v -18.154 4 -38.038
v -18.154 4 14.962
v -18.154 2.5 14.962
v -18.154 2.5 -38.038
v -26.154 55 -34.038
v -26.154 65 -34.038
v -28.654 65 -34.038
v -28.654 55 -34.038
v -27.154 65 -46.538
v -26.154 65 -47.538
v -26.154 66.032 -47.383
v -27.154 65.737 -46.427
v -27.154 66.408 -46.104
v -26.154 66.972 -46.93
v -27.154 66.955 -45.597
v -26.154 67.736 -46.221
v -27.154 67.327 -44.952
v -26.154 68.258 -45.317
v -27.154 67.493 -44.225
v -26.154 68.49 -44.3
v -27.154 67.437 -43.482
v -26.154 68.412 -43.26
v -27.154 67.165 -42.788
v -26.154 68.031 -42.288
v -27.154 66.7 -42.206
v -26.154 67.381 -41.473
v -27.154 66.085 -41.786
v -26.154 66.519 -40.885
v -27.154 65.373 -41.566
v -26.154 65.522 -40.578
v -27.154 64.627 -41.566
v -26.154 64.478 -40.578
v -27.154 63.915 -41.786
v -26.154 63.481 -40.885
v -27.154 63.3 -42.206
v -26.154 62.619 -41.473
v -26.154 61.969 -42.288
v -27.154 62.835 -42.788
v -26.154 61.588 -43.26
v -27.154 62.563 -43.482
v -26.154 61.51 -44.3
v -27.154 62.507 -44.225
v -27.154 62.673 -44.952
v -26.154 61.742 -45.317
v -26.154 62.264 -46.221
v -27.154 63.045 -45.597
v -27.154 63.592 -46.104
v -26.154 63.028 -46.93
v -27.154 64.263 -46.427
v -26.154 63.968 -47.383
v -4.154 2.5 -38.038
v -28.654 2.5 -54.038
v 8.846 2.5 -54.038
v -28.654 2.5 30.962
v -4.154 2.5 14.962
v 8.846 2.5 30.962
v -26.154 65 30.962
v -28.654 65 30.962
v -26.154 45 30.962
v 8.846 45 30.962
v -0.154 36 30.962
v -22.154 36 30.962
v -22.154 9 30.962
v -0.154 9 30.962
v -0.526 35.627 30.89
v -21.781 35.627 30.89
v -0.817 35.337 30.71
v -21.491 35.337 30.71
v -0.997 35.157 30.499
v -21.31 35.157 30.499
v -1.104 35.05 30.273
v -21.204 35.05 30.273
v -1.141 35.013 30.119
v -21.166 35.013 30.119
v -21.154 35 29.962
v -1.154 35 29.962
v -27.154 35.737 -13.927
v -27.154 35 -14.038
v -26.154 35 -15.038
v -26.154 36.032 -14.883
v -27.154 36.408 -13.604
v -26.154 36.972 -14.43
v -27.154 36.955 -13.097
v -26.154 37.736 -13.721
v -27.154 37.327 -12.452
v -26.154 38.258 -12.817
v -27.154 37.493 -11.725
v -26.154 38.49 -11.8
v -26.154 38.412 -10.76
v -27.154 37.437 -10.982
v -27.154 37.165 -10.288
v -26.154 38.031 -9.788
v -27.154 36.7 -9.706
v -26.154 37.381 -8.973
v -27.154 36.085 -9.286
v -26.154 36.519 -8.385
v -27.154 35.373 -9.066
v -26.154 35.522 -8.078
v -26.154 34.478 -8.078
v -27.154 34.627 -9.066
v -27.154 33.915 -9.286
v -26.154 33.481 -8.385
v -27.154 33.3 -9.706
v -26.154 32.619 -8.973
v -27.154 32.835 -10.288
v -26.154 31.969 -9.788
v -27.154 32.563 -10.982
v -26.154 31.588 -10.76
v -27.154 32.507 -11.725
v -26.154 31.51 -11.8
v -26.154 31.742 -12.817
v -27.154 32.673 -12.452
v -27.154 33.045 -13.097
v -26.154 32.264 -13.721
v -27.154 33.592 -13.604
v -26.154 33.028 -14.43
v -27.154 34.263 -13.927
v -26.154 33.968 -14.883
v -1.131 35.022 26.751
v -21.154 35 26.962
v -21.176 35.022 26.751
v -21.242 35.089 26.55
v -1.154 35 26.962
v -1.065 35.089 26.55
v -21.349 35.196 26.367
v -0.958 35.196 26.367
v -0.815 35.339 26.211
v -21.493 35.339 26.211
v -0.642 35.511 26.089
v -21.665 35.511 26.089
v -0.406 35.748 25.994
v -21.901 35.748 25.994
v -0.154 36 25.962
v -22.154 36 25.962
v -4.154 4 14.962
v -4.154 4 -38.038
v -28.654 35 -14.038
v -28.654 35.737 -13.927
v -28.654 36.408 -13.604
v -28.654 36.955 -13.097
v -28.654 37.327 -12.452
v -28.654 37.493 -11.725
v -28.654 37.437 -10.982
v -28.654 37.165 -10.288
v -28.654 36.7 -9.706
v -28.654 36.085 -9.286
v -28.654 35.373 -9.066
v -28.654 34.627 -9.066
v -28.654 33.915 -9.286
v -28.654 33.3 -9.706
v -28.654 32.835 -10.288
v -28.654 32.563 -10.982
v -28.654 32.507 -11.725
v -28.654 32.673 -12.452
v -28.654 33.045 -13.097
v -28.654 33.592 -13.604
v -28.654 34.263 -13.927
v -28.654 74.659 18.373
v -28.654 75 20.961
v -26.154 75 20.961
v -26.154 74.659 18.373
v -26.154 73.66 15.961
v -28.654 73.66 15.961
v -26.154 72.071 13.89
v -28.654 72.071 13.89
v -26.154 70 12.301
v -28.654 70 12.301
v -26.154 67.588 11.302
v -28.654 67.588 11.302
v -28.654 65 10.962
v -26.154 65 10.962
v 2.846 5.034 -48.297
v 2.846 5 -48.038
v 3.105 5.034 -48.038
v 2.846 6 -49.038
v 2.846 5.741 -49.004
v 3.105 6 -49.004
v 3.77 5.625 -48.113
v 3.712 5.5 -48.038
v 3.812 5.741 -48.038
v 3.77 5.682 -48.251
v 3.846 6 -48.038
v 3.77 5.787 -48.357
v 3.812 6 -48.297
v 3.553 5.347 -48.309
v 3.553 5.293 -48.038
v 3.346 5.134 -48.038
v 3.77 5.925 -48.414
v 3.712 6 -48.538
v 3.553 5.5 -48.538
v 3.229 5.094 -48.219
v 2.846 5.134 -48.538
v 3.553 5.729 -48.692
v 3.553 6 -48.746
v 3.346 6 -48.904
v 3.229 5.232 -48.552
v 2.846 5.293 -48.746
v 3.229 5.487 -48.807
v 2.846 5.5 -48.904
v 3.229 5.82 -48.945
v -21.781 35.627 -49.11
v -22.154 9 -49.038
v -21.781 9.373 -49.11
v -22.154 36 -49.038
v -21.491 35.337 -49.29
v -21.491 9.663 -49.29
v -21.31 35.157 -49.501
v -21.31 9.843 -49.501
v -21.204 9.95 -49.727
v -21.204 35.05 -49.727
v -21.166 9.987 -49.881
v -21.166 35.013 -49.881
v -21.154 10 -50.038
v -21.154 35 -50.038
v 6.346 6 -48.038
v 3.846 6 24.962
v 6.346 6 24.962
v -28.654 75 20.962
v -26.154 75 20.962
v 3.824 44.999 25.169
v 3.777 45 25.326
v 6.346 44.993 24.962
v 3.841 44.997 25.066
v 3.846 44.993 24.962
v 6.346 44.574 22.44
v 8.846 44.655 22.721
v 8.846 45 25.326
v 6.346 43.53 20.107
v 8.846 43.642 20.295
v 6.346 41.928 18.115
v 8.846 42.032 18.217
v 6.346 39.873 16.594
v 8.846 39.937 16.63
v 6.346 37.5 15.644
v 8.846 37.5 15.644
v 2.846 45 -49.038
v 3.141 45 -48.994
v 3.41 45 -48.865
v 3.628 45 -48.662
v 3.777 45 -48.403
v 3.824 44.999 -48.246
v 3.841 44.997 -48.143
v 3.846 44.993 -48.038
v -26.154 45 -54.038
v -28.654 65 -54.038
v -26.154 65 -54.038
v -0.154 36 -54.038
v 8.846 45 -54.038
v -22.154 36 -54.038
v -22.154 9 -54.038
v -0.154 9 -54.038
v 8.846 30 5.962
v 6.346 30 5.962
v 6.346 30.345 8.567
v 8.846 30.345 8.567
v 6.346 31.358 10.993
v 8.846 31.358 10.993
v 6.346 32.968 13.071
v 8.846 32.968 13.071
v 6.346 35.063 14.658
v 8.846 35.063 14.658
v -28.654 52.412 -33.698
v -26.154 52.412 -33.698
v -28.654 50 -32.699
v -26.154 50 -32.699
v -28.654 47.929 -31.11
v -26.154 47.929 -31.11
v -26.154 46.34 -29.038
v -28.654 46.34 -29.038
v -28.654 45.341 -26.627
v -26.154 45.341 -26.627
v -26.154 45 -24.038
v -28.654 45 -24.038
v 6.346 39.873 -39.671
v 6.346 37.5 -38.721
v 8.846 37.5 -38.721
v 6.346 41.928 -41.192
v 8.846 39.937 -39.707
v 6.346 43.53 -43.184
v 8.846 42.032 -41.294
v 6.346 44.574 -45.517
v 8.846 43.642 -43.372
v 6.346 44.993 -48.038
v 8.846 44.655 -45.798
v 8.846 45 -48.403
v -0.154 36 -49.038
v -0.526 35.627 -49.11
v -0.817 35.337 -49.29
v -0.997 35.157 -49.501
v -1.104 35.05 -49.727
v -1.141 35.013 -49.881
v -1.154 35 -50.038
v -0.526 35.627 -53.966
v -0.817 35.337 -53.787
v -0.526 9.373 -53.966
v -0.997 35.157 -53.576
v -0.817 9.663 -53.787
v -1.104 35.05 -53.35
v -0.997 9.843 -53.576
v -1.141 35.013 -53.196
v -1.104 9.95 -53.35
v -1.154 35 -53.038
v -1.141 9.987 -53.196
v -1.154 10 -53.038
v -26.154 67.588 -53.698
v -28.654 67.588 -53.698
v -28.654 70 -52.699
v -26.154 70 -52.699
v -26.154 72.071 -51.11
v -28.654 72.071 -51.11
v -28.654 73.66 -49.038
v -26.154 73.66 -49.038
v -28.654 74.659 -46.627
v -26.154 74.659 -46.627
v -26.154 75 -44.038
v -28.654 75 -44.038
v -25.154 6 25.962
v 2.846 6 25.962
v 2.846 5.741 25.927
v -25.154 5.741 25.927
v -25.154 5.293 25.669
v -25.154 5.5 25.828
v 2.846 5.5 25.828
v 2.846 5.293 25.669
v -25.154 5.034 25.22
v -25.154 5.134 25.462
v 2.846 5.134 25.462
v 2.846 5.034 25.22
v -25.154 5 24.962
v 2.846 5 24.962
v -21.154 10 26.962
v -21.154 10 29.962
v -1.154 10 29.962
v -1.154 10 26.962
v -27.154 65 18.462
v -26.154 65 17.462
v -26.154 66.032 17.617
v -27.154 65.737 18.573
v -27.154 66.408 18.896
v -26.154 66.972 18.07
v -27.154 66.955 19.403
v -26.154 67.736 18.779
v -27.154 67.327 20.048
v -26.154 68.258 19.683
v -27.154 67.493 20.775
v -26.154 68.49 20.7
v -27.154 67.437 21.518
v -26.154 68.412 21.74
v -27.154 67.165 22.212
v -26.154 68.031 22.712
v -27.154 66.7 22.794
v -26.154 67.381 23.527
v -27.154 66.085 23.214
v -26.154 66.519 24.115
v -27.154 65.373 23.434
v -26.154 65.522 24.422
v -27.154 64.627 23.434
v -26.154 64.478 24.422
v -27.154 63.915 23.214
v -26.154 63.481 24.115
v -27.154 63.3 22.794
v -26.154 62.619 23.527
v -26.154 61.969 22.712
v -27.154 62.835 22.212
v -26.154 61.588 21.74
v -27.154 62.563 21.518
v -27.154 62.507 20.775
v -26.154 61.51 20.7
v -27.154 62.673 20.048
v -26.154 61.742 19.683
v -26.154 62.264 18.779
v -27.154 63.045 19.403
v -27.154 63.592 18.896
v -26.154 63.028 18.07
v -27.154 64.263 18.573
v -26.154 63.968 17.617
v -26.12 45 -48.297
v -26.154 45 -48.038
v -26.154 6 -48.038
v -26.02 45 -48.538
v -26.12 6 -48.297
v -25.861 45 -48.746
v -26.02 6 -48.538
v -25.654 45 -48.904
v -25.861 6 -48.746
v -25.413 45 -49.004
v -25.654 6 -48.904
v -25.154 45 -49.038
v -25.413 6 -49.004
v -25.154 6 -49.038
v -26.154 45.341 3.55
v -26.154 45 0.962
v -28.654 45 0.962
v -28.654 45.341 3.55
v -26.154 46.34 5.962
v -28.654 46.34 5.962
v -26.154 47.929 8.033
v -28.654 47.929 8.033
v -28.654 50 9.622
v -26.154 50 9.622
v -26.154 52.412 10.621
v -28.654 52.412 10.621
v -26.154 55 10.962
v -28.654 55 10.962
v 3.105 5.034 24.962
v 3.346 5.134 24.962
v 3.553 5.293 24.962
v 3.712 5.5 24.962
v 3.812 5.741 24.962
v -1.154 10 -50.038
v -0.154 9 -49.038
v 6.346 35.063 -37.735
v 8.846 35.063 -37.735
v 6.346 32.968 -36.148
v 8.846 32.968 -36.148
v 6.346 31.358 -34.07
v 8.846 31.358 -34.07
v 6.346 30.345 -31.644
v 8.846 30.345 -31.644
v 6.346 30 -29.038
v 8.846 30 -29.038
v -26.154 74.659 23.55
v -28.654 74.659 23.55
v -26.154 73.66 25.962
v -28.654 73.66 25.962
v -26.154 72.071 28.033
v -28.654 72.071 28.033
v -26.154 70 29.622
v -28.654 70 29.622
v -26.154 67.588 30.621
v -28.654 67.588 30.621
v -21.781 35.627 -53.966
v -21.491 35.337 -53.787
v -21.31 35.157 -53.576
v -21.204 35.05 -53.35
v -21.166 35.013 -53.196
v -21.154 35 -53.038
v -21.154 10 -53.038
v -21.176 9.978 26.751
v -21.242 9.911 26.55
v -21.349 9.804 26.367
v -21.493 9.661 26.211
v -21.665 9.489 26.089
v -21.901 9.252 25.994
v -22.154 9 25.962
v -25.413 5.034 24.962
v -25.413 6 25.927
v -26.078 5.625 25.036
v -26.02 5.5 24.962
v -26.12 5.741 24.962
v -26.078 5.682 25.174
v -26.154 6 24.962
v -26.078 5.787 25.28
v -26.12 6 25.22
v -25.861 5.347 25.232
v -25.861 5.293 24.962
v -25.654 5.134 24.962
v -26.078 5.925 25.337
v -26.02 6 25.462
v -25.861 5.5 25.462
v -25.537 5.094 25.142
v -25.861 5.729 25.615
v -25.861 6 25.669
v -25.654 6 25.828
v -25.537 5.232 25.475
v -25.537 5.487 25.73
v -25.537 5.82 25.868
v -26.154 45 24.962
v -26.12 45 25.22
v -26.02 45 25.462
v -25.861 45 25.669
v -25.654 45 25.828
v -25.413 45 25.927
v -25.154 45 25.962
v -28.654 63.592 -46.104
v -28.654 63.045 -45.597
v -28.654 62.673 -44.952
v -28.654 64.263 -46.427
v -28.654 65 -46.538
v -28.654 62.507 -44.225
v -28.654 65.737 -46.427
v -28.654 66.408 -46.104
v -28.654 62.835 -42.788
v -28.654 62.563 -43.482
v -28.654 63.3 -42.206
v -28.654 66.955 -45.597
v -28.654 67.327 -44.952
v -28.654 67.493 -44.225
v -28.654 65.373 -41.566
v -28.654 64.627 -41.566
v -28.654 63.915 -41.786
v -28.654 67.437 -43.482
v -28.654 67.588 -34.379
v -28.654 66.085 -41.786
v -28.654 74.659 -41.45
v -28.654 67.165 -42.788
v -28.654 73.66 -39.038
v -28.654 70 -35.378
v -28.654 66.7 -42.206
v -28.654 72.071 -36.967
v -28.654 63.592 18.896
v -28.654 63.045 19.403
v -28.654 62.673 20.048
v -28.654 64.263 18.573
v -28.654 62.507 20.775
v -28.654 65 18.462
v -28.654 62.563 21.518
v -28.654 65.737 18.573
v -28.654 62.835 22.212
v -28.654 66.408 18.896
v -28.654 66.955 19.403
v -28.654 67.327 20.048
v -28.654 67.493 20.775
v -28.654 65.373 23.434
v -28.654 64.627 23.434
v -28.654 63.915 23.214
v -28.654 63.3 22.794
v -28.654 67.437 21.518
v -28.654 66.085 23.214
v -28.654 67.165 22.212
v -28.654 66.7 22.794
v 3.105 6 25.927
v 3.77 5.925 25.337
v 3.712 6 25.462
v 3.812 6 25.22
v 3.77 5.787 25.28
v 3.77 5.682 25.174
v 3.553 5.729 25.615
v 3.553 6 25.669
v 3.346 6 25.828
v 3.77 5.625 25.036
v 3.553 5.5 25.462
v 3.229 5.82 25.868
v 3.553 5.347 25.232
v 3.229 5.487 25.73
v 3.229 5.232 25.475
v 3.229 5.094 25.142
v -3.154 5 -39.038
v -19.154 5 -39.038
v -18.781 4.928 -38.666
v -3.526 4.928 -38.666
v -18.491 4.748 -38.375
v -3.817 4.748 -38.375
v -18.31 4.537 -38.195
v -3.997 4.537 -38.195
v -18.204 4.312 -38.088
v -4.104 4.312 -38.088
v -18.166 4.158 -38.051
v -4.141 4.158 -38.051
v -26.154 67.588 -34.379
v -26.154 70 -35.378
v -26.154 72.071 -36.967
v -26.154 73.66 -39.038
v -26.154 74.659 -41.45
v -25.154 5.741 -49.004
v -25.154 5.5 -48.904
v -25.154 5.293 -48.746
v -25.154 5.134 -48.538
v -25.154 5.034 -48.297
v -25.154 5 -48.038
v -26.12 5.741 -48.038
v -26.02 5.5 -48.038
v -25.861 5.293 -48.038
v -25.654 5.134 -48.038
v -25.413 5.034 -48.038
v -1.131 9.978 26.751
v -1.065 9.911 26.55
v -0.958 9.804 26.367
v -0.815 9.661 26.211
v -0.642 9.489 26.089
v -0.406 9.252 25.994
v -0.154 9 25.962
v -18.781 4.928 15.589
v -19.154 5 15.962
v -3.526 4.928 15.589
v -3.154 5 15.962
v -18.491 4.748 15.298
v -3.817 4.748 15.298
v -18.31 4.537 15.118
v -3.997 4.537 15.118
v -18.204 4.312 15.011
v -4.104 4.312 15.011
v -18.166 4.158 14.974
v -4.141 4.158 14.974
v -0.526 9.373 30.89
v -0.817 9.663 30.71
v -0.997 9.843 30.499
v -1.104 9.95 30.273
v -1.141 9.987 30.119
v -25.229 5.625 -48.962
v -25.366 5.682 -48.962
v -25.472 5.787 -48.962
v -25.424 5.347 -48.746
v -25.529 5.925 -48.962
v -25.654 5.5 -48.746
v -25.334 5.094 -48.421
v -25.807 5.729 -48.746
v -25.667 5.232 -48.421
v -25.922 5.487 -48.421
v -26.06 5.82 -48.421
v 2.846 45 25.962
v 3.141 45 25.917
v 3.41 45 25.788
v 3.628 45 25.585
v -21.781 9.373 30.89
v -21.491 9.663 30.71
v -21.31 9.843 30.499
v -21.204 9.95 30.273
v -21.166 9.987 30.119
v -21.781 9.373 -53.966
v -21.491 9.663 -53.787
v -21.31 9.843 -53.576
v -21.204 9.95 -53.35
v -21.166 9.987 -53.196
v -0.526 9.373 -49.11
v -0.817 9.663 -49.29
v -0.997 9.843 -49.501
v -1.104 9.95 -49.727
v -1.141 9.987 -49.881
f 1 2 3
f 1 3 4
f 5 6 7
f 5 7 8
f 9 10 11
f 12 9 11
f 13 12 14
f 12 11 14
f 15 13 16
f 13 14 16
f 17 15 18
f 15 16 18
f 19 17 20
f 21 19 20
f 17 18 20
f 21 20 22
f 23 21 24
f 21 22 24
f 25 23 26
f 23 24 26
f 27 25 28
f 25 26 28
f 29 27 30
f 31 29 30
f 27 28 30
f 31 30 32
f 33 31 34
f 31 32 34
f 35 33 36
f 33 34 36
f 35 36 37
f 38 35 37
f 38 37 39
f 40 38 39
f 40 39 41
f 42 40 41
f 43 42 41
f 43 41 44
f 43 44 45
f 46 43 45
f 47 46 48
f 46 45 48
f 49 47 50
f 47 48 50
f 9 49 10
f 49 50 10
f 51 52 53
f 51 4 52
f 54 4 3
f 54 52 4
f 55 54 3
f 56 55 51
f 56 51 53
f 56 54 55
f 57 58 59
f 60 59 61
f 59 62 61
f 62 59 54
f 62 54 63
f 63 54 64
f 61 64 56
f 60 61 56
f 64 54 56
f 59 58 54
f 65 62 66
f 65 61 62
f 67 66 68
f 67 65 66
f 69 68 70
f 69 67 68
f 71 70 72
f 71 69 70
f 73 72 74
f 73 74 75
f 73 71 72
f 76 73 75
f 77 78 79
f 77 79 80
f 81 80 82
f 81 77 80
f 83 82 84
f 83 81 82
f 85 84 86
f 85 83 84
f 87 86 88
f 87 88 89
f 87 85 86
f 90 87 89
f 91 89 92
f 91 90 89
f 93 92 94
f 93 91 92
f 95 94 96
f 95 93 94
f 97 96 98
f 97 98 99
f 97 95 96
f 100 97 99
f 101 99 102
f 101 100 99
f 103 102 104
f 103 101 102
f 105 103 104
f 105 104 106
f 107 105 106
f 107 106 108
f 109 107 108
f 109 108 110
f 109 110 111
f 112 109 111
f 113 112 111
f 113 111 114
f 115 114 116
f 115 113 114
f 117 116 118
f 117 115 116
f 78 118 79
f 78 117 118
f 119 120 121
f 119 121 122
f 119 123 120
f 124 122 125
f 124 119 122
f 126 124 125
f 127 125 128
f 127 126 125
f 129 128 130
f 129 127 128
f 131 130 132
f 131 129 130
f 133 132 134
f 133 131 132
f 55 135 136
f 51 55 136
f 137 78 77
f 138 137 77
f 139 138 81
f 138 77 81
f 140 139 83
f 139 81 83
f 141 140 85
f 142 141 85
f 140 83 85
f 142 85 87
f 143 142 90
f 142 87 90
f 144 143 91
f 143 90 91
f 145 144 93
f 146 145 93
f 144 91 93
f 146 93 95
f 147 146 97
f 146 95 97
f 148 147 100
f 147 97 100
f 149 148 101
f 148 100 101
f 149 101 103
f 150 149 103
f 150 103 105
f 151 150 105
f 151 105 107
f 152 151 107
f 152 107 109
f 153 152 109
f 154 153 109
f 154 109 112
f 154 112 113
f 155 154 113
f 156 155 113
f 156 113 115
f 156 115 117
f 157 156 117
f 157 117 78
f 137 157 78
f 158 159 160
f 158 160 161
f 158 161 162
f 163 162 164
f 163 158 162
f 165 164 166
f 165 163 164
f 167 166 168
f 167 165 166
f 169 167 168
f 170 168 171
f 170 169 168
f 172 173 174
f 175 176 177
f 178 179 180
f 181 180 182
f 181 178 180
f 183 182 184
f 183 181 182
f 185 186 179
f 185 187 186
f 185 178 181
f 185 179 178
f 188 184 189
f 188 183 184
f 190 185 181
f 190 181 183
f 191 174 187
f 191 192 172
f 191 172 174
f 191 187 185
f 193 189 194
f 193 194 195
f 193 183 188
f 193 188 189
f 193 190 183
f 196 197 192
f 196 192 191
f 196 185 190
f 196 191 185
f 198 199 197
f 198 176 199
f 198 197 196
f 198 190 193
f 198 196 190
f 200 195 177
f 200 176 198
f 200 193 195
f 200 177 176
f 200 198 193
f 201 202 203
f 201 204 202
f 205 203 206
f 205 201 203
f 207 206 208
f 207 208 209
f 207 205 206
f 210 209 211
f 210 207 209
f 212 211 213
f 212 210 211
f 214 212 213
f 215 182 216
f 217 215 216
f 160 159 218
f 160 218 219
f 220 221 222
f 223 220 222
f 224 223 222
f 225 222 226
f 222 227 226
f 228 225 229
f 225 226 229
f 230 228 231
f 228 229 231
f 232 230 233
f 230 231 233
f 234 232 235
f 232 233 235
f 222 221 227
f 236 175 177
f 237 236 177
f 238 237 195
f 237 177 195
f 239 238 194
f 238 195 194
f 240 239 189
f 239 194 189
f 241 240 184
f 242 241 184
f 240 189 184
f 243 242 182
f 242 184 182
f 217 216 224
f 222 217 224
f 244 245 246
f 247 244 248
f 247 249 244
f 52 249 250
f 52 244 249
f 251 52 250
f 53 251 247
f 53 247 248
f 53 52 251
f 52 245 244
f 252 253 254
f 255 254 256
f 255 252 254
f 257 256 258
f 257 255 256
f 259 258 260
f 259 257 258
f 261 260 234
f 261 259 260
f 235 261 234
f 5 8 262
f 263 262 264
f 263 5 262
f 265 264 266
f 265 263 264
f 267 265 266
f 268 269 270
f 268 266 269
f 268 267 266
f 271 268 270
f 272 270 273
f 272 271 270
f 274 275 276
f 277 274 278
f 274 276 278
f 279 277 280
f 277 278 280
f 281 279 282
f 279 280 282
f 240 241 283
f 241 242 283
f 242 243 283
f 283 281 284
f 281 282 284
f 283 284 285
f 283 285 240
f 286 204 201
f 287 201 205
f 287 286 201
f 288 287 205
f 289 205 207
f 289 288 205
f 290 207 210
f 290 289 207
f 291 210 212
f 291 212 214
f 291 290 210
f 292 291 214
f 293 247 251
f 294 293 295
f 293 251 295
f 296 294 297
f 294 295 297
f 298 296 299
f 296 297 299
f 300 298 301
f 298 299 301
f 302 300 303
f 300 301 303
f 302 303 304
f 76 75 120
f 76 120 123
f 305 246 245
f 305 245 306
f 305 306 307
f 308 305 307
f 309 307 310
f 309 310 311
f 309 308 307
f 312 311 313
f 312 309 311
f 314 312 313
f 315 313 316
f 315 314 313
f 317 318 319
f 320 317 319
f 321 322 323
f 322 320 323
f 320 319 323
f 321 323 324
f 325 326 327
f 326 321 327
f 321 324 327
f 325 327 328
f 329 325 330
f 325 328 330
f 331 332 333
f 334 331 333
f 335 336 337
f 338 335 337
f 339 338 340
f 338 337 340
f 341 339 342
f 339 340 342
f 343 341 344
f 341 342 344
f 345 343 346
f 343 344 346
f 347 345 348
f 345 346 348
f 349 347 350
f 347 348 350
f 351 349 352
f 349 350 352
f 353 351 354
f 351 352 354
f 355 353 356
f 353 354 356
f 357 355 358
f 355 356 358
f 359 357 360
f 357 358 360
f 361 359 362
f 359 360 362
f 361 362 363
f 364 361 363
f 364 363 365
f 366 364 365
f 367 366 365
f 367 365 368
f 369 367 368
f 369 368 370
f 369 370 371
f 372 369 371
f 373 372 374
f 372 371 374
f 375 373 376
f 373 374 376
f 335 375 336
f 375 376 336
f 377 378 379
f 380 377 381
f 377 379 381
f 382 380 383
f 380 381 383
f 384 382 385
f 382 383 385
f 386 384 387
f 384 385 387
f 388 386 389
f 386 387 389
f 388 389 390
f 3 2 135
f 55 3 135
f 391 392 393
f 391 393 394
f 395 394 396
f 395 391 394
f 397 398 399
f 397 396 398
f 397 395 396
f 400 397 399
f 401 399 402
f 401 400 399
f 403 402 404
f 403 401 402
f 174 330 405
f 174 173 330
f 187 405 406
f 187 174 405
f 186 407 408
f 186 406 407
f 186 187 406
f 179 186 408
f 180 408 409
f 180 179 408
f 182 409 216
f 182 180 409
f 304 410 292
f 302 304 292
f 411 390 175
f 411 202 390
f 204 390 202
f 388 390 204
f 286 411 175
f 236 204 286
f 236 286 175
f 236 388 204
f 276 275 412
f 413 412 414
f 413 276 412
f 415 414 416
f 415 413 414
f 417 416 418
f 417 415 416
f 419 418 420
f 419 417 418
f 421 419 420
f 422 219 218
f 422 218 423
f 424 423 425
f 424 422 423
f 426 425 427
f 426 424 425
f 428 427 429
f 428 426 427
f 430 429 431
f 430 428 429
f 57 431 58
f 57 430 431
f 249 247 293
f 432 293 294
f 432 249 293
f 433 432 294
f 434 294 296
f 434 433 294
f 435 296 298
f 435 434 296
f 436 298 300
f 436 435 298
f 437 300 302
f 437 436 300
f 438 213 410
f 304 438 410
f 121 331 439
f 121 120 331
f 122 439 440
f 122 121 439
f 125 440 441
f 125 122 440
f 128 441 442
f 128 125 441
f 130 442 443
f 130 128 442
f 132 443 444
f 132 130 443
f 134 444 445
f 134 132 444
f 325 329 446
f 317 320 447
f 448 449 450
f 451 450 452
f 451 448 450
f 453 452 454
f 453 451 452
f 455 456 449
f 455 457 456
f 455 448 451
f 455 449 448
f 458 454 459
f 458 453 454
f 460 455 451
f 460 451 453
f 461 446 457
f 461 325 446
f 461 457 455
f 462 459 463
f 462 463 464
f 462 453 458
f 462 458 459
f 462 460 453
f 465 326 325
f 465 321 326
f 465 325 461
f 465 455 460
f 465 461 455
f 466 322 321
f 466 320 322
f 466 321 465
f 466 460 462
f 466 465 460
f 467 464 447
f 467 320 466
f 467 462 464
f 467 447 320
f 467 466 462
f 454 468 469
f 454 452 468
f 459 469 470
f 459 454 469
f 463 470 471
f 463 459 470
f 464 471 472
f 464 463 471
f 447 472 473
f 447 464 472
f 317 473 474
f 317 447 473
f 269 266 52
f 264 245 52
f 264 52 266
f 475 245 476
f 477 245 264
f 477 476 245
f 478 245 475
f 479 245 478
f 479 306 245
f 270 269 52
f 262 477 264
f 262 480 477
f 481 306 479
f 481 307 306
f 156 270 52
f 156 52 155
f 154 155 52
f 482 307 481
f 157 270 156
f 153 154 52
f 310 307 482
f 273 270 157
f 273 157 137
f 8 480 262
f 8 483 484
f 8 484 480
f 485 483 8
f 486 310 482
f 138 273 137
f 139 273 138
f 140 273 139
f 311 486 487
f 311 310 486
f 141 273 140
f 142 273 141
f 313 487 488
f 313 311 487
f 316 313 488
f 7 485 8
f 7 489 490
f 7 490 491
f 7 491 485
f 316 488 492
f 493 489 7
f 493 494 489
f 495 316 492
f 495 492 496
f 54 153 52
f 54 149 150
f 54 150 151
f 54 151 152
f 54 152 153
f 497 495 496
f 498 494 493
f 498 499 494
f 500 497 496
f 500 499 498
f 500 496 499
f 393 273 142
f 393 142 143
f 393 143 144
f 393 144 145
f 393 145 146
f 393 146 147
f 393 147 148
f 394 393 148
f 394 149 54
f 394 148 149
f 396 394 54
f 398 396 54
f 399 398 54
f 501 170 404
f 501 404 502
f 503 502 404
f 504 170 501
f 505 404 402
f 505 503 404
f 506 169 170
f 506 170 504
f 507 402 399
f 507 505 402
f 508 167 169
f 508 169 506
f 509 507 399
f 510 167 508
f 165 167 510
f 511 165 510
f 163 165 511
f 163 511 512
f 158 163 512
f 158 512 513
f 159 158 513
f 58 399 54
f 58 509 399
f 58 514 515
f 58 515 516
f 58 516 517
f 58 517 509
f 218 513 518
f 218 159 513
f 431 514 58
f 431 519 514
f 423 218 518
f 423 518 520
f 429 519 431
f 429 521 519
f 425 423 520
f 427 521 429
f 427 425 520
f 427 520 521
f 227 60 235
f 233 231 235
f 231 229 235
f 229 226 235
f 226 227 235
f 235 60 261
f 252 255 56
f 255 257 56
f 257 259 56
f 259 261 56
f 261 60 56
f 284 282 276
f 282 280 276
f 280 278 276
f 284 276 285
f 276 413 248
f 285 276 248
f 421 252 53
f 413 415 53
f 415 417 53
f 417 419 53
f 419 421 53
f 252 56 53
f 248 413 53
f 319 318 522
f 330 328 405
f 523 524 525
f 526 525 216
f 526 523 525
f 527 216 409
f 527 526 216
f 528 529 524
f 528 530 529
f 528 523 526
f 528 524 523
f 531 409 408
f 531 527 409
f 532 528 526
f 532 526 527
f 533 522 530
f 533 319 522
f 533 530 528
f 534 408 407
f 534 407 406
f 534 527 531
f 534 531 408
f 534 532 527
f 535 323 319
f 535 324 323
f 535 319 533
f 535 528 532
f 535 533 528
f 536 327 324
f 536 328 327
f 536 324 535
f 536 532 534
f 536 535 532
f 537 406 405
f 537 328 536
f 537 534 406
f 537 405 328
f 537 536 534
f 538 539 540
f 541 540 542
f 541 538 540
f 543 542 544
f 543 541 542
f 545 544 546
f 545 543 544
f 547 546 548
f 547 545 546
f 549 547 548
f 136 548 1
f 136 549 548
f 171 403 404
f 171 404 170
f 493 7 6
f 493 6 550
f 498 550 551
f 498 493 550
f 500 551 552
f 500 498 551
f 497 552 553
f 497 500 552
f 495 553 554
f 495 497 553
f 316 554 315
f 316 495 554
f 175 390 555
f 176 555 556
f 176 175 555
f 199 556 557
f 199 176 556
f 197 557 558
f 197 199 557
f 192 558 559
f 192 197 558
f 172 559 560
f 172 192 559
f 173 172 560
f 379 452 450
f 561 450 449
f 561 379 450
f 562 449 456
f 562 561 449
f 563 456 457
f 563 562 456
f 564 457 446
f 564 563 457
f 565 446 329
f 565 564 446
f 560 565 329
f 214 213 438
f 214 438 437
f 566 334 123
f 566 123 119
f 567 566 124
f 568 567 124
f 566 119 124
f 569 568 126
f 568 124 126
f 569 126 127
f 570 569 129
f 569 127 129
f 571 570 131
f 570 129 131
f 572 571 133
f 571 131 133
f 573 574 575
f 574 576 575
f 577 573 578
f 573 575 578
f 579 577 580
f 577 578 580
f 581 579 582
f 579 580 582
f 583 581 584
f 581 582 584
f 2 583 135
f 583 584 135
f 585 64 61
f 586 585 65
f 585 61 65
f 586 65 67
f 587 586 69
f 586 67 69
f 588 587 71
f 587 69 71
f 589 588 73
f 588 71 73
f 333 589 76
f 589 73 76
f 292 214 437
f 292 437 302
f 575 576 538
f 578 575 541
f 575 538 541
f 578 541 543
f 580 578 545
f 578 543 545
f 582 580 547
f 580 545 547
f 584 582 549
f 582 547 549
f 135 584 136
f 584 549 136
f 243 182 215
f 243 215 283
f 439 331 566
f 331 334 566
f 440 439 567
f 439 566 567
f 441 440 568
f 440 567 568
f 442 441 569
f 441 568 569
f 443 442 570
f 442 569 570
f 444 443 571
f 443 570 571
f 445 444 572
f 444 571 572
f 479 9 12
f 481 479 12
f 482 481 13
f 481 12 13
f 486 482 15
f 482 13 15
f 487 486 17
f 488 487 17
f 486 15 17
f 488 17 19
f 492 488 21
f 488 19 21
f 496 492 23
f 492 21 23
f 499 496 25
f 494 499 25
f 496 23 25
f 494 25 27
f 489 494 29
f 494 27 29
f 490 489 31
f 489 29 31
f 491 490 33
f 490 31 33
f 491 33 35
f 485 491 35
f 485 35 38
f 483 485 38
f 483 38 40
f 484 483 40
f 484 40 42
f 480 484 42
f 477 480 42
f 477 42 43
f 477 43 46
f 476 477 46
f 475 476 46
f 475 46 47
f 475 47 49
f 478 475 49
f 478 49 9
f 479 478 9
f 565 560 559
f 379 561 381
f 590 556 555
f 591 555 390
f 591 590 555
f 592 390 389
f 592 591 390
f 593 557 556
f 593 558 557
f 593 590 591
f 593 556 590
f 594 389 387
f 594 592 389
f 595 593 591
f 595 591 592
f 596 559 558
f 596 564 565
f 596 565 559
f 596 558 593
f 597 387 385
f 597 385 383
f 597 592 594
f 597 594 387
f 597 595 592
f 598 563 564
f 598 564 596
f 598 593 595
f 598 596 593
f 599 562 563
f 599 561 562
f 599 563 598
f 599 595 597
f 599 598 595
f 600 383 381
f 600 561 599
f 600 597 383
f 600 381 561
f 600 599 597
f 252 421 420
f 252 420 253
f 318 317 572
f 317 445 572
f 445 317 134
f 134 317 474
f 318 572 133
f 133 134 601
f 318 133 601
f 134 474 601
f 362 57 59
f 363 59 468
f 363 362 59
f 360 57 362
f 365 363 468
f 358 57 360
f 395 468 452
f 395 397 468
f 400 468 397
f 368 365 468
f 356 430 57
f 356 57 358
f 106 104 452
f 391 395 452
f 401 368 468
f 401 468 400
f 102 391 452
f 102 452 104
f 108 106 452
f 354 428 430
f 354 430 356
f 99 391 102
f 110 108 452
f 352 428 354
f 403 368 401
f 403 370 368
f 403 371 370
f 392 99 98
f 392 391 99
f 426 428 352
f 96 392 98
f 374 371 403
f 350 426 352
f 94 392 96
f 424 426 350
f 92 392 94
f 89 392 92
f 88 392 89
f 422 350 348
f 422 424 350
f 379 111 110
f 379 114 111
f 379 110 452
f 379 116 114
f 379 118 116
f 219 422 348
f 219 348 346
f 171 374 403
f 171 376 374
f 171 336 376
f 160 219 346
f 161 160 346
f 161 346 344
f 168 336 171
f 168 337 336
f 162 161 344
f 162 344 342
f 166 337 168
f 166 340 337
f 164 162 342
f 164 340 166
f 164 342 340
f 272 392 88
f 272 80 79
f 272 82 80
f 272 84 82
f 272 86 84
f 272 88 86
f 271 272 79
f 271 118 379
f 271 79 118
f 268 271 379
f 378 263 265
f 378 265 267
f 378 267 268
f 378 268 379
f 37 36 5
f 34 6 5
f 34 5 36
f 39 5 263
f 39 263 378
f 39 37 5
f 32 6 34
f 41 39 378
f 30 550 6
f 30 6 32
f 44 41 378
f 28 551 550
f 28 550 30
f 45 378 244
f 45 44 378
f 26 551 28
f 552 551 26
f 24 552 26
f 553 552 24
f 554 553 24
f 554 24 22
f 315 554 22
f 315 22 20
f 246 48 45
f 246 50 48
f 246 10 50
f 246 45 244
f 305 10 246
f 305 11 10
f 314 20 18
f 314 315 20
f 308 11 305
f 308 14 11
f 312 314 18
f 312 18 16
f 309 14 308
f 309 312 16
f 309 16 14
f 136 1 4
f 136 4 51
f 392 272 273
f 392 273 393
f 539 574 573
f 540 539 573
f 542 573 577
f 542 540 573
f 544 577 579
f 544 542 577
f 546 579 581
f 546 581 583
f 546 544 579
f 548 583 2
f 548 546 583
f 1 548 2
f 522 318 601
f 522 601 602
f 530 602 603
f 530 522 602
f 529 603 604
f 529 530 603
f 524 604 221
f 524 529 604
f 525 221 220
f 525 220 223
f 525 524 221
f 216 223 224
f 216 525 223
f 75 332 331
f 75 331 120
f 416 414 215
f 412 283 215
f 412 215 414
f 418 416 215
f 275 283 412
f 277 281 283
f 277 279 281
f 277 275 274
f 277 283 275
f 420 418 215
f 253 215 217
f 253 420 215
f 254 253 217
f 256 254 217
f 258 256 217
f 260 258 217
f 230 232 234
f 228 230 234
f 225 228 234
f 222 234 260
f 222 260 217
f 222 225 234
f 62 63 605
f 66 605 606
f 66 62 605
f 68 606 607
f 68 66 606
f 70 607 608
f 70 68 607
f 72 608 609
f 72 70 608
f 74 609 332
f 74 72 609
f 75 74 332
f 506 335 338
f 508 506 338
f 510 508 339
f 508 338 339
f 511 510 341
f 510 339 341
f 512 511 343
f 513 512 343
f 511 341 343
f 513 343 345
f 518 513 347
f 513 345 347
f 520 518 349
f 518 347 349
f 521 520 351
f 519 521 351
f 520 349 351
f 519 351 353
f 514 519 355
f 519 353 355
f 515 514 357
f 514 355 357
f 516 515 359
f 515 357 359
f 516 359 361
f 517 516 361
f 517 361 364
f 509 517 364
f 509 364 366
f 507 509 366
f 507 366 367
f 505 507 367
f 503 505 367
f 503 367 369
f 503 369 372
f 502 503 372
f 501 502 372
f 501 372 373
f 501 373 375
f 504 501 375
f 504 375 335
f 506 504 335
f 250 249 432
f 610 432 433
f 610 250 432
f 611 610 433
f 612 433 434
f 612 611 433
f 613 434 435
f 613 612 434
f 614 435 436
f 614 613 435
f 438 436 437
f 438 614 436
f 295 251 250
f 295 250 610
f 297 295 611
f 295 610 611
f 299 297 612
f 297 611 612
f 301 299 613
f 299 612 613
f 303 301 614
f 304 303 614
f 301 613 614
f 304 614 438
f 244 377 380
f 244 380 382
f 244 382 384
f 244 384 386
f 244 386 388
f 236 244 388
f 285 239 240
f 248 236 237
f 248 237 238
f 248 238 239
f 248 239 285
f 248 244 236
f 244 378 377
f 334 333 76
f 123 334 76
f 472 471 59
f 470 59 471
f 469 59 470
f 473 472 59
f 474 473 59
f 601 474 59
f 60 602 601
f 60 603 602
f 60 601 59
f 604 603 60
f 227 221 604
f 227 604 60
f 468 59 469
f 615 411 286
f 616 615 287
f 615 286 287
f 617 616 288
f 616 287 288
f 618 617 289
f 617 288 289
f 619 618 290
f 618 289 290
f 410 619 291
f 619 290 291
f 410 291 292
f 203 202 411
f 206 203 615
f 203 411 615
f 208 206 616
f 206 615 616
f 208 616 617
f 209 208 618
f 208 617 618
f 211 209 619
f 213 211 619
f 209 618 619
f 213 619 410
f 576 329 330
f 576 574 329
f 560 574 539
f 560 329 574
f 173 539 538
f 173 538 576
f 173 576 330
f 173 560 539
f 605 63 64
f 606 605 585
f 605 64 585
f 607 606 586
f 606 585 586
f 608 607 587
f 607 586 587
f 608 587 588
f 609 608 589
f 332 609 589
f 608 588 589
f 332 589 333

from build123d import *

# Parameters (mm, degrees)
SKETCH1_W           = 40
SKETCH1_H           = 85
BOSS_EXTRUDE1_DEPTH = 75
SKETCH3_OUTSIDE_W   = 66.042
SKETCH3_OUTSIDE_H   = 111.042
SKETCH3_OUTSIDE_W_2 = 40
SKETCH3_OUTSIDE_H_2 = 85
SKETCH3_OUTSIDE_W_3 = 30
SKETCH3_OUTSIDE_H_3 = 75
CUT_EXTRUDE2_DEPTH  = 70
SKETCH4_W           = 35
SKETCH4_H           = 85
CUT_EXTRUDE3_DEPTH  = 30
FILLET1_R           = 10
SKETCH5_R           = 2.5
CUT_EXTRUDE4_DEPTH  = 30
CHAMFER1_SIZE       = 1
CUT_EXTRUDE5_DEPTH  = 30
FILLET2_R           = 1
FILLET3_R           = 10
SKETCH7_W           = 14
SKETCH7_H           = 53
CUT_EXTRUDE6_DEPTH  = 30
FILLET4_R           = 1
CUT_EXTRUDE7_DEPTH  = 30
FILLET5_R           = 10
SKETCH9_R           = 2.5
CUT_EXTRUDE8_DEPTH  = 30
CHAMFER2_SIZE       = 1
SKETCH10_W          = 20
SKETCH10_H          = 25
CUT_EXTRUDE9_DEPTH  = 130
FILLET6_R           = 1
FILLET7_R           = 1
SKETCH12_W          = 99.145482585
SKETCH12_H          = 91.596568109
CUT_EXTRUDE11_DEPTH = 2.5
SKETCH13_W          = 51.22831634
SKETCH13_H          = 105.793314496
CUT_EXTRUDE12_DEPTH = 2.5
SKETCH14_W          = 73
SKETCH14_H          = 70.039653543
CUT_EXTRUDE13_DEPTH = 2.5


# Some blends are built 0.0001 mm under size
with BuildPart() as part:
    # Sketch1 → Boss-Extrude1 (new body)
    with BuildSketch(Plane(origin=(0, 0, 0), x_dir=(1, 0, 0), z_dir=(0, 1, 0))):
        with Locations((-11.153846154, 11.538461538)):
            Rectangle(SKETCH1_W, SKETCH1_H)
    extrude(amount=BOSS_EXTRUDE1_DEPTH)

    # Sketch3 outside → Cut-Extrude2 (cut)
    # profile 1 of 2: a face of its own
    with BuildSketch(Plane(origin=(0, 75, 0), x_dir=(1, 0, 0), z_dir=(0, 1, 0))):
        with Locations((-11.154, 11.538)):
            Rectangle(SKETCH3_OUTSIDE_W, SKETCH3_OUTSIDE_H)
        with Locations((-11.153846154, 11.538461538)):
            Rectangle(SKETCH3_OUTSIDE_W_2, SKETCH3_OUTSIDE_H_2, mode=Mode.SUBTRACT)
    # profile 2 of 2: a face of its own
    with BuildSketch(Plane(origin=(0, 75, 0), x_dir=(1, 0, 0), z_dir=(0, 1, 0))):
        with Locations((-11.153846154, 11.538461538)):
            Rectangle(SKETCH3_OUTSIDE_W_3, SKETCH3_OUTSIDE_H_3)
    extrude(amount=-CUT_EXTRUDE2_DEPTH, mode=Mode.SUBTRACT)

    # Sketch4 → Cut-Extrude3 (cut)
    with BuildSketch(Plane(origin=(0, 75, 0), x_dir=(1, 0, 0), z_dir=(0, 1, 0))):
        with Locations((-8.653846154, 11.538461538)):
            Rectangle(SKETCH4_W, SKETCH4_H)
    extrude(amount=-CUT_EXTRUDE3_DEPTH, mode=Mode.SUBTRACT)

    # Fillet1
    fillet1_edges = [part.edges().sort_by_distance(p)[0] for p in [
        (-28.653846154, 75, -54.038461538),
        (-28.653846154, 75, 30.961538462),
    ]]
    fillet(fillet1_edges, radius=FILLET1_R)

    # Sketch5 → Cut-Extrude4 (cut)
    with BuildSketch(Plane(origin=(-26.153846154, 0, 0), x_dir=(0, 0, -1), z_dir=(1, 0, 0))):
        with Locations((-20.961538462, 65)):
            Circle(SKETCH5_R)
        with Locations((44.038461538, 65)):
            Circle(SKETCH5_R)
    extrude(amount=-CUT_EXTRUDE4_DEPTH, mode=Mode.SUBTRACT)

    # Chamfer1
    chamfer1_edges = [part.edges().sort_by_distance(p)[0] for p in [
        (-26.153846154, 65, 23.461538462),
        (-26.153846154, 65, -41.538461538),
    ]]
    chamfer(chamfer1_edges, length=CHAMFER1_SIZE)

    # Sketch6 → Cut-Extrude5 (cut)
    with BuildSketch(Plane(origin=(8.846153846, 0, 0), x_dir=(0, 0, -1), z_dir=(1, 0, 0))):
        with BuildLine():
            Line((-15.961538462, 45), (39.038461538, 45))
            Line((39.038461538, 45), (39.038461538, 40))
            ThreePointArc((39.038461538, 40), (36.10952935, 32.928932188), (29.038461538, 30))
            Line((29.038461538, 30), (-5.961538462, 30))
            ThreePointArc((-5.961538462, 30), (-13.032606273, 32.928932188), (-15.961538462, 40))
            Line((-15.961538462, 40), (-15.961538462, 45))
        make_face()
    extrude(amount=-CUT_EXTRUDE5_DEPTH, mode=Mode.SUBTRACT)

    # Fillet2
    fillet2_edges = [part.edges().sort_by_distance(p)[0] for p in [
        (-11.153846154, 5, 25.961538462),
        (3.846153846, 25, 25.961538462),
        (-26.153846154, 5, -11.538461538),
        (-26.153846154, 25, 25.961538462),
        (-11.153846154, 5, -49.038461538),
        (-26.153846154, 25, -49.038461538),
        (3.846153846, 5, -11.538461538),
        (3.846153846, 25, -49.038461538),
    ]]
    fillet(fillet2_edges, radius=FILLET2_R)

    # Fillet3
    # the kernel refuses this fillet: 10 mm, written as the material it takes off along each edge
    with BuildSketch(Plane(origin=(32.258445674, 45, 15.961538462), x_dir=(0, -0.9991049126334702, -0.04230098759681175), z_dir=(-1, 0, 0))) as fillet3_piece_1:
        with BuildLine():
            CenterArc((9.5949039, 9.779544188), FILLET3_R, 182.424391449, 75.522487814)
            Line((-0.396145226, 9.356534312), (-1.395250139, 9.314233325))
            Line((-1.395250139, 9.314233325), (-0.999104913, -0.042300988))
            Line((-0.999104913, -0.042300988), (0.042300988, -0.999104913))
            ThreePointArc((0.042300988, -0.999104913), (5.037825551, -0.787599975), (7.297900696, -0.977954419))
            Line((7.297900696, -0.977954419), (7.506719169, 0))
        make_face()
    extrude(amount=51.824583655, mode=Mode.SUBTRACT)
    with BuildSketch(Plane(origin=(32.258445674, 45, -39.038461538), x_dir=(0, -0.9991049126334705, 0.04230098759681053), z_dir=(-1, 0, 0))) as fillet3_piece_2:
        with BuildLine():
            CenterArc((9.5949039, -9.779544188), FILLET3_R, 102.053120737, 75.522487814)
            Line((-0.396145226, -9.356534312), (-1.395250139, -9.314233325))
            Line((-1.395250139, -9.314233325), (-0.999104913, 0.042300988))
            Line((-0.999104913, 0.042300988), (0.042300988, 0.999104913))
            ThreePointArc((0.042300988, 0.999104913), (5.037825551, 0.787599975), (7.297900696, 0.977954419))
            Line((7.297900696, 0.977954419), (7.506719169, 0))
        make_face()
    extrude(amount=51.824583655, mode=Mode.SUBTRACT)

    # Sketch7 → Cut-Extrude6 (cut)
    with BuildSketch(Plane(origin=(0, 5, 0), x_dir=(1, 0, 0), z_dir=(0, 1, 0))):
        with Locations((-11.153846154, 11.538461538)):
            Rectangle(SKETCH7_W, SKETCH7_H)
    extrude(amount=-CUT_EXTRUDE6_DEPTH, mode=Mode.SUBTRACT)

    # Fillet4
    fillet4_edges = [part.edges().sort_by_distance(p)[0] for p in [
        (-18.153846154, 5, -11.538461538),
        (-11.153846154, 5, 14.961538462),
        (-4.153846154, 5, -11.538461538),
        (-11.153846154, 5, -38.038461538),
    ]]
    fillet(fillet4_edges, radius=FILLET4_R)

    # Sketch8 → Cut-Extrude7 (cut)
    with BuildSketch(Plane(origin=(-26.153846154, 0, 0), x_dir=(0, 0, -1), z_dir=(1, 0, 0))):
        with BuildLine():
            Line((-10.961538462, 75), (34.038461538, 75))
            Line((34.038461538, 75), (34.038461538, 55))
            ThreePointArc((34.038461538, 55), (31.10952935, 47.928932188), (24.038461538, 45))
            Line((24.038461538, 45), (-0.961538462, 45))
            ThreePointArc((-0.961538462, 45), (-8.032606273, 47.928932188), (-10.961538462, 55))
            Line((-10.961538462, 55), (-10.961538462, 75))
        make_face()
    extrude(amount=-CUT_EXTRUDE7_DEPTH, mode=Mode.SUBTRACT)

    # Fillet5
    fillet5_edges = [part.edges().sort_by_distance(p)[0] for p in [
        (-28.653846154, 75, -34.038461538),
        (-28.653846154, 75, 10.961538462),
    ]]
    fillet(fillet5_edges, radius=FILLET5_R - 0.0001)  # a hair under: the kernel refuses the full size

    # Sketch9 → Cut-Extrude8 (cut)
    with BuildSketch(Plane(origin=(-26.153846154, 0, 0), x_dir=(0, 0, -1), z_dir=(1, 0, 0))):
        with Locations((11.538461538, 35)):
            Circle(SKETCH9_R)
    extrude(amount=-CUT_EXTRUDE8_DEPTH, mode=Mode.SUBTRACT)

    # Chamfer2
    chamfer2_edges = [part.edges().sort_by_distance(p)[0] for p in [
        (-26.153846154, 35, -9.038461538),
    ]]
    chamfer(chamfer2_edges, length=CHAMFER2_SIZE)

    # Sketch10 → Cut-Extrude9 (cut)
    with BuildSketch(Plane.XY.offset(30.961538462)):
        with Locations((-11.153846154, 22.5)):
            Rectangle(SKETCH10_W, SKETCH10_H)
    extrude(amount=-CUT_EXTRUDE9_DEPTH, mode=Mode.SUBTRACT)

    # Fillet6
    fillet6_edges = [part.edges().sort_by_distance(p)[0] for p in [
        (-21.153846154, 22.5, 25.961538462),
        (-11.153846154, 35, 25.961538462),
        (-1.153846154, 22.5, 25.961538462),
        (-11.153846154, 10, 25.961538462),
        (-21.153846154, 22.5, 30.961538462),
        (-11.153846154, 10, 30.961538462),
        (-1.153846154, 22.5, 30.961538462),
        (-11.153846154, 35, 30.961538462),
    ]]
    fillet(fillet6_edges, radius=FILLET6_R)

    # Fillet7
    fillet7_edges = [part.edges().sort_by_distance(p)[0] for p in [
        (-11.153846154, 10, -49.038461538),
        (-1.153846154, 22.5, -49.038461538),
        (-11.153846154, 35, -49.038461538),
        (-21.153846154, 22.5, -49.038461538),
        (-21.153846154, 22.5, -54.038461538),
        (-11.153846154, 35, -54.038461538),
        (-1.153846154, 22.5, -54.038461538),
        (-11.153846154, 10, -54.038461538),
    ]]
    fillet(fillet7_edges, radius=FILLET7_R)

    # Sketch12 → Cut-Extrude11 (cut)
    with BuildSketch(Plane.ZY.offset(31.153846154)):
        with Locations((-8.86612538, 45.798284055)):
            Rectangle(SKETCH12_W, SKETCH12_H)
    extrude(amount=-CUT_EXTRUDE11_DEPTH, mode=Mode.SUBTRACT)

    # Sketch13 → Cut-Extrude12 (cut)
    with BuildSketch(Plane.XZ):
        with Locations((-8.23266401, -21.935118786)):
            Rectangle(SKETCH13_W, SKETCH13_H)
    extrude(amount=-CUT_EXTRUDE12_DEPTH, mode=Mode.SUBTRACT)

    # Sketch14 → Cut-Extrude13 (cut)
    with BuildSketch(Plane.ZY.offset(-3.846153846)):
        with Locations((-11.538461538, 41.019826772)):
            Rectangle(SKETCH14_W, SKETCH14_H)
    extrude(amount=-CUT_EXTRUDE13_DEPTH, mode=Mode.SUBTRACT)


solid = part.part
